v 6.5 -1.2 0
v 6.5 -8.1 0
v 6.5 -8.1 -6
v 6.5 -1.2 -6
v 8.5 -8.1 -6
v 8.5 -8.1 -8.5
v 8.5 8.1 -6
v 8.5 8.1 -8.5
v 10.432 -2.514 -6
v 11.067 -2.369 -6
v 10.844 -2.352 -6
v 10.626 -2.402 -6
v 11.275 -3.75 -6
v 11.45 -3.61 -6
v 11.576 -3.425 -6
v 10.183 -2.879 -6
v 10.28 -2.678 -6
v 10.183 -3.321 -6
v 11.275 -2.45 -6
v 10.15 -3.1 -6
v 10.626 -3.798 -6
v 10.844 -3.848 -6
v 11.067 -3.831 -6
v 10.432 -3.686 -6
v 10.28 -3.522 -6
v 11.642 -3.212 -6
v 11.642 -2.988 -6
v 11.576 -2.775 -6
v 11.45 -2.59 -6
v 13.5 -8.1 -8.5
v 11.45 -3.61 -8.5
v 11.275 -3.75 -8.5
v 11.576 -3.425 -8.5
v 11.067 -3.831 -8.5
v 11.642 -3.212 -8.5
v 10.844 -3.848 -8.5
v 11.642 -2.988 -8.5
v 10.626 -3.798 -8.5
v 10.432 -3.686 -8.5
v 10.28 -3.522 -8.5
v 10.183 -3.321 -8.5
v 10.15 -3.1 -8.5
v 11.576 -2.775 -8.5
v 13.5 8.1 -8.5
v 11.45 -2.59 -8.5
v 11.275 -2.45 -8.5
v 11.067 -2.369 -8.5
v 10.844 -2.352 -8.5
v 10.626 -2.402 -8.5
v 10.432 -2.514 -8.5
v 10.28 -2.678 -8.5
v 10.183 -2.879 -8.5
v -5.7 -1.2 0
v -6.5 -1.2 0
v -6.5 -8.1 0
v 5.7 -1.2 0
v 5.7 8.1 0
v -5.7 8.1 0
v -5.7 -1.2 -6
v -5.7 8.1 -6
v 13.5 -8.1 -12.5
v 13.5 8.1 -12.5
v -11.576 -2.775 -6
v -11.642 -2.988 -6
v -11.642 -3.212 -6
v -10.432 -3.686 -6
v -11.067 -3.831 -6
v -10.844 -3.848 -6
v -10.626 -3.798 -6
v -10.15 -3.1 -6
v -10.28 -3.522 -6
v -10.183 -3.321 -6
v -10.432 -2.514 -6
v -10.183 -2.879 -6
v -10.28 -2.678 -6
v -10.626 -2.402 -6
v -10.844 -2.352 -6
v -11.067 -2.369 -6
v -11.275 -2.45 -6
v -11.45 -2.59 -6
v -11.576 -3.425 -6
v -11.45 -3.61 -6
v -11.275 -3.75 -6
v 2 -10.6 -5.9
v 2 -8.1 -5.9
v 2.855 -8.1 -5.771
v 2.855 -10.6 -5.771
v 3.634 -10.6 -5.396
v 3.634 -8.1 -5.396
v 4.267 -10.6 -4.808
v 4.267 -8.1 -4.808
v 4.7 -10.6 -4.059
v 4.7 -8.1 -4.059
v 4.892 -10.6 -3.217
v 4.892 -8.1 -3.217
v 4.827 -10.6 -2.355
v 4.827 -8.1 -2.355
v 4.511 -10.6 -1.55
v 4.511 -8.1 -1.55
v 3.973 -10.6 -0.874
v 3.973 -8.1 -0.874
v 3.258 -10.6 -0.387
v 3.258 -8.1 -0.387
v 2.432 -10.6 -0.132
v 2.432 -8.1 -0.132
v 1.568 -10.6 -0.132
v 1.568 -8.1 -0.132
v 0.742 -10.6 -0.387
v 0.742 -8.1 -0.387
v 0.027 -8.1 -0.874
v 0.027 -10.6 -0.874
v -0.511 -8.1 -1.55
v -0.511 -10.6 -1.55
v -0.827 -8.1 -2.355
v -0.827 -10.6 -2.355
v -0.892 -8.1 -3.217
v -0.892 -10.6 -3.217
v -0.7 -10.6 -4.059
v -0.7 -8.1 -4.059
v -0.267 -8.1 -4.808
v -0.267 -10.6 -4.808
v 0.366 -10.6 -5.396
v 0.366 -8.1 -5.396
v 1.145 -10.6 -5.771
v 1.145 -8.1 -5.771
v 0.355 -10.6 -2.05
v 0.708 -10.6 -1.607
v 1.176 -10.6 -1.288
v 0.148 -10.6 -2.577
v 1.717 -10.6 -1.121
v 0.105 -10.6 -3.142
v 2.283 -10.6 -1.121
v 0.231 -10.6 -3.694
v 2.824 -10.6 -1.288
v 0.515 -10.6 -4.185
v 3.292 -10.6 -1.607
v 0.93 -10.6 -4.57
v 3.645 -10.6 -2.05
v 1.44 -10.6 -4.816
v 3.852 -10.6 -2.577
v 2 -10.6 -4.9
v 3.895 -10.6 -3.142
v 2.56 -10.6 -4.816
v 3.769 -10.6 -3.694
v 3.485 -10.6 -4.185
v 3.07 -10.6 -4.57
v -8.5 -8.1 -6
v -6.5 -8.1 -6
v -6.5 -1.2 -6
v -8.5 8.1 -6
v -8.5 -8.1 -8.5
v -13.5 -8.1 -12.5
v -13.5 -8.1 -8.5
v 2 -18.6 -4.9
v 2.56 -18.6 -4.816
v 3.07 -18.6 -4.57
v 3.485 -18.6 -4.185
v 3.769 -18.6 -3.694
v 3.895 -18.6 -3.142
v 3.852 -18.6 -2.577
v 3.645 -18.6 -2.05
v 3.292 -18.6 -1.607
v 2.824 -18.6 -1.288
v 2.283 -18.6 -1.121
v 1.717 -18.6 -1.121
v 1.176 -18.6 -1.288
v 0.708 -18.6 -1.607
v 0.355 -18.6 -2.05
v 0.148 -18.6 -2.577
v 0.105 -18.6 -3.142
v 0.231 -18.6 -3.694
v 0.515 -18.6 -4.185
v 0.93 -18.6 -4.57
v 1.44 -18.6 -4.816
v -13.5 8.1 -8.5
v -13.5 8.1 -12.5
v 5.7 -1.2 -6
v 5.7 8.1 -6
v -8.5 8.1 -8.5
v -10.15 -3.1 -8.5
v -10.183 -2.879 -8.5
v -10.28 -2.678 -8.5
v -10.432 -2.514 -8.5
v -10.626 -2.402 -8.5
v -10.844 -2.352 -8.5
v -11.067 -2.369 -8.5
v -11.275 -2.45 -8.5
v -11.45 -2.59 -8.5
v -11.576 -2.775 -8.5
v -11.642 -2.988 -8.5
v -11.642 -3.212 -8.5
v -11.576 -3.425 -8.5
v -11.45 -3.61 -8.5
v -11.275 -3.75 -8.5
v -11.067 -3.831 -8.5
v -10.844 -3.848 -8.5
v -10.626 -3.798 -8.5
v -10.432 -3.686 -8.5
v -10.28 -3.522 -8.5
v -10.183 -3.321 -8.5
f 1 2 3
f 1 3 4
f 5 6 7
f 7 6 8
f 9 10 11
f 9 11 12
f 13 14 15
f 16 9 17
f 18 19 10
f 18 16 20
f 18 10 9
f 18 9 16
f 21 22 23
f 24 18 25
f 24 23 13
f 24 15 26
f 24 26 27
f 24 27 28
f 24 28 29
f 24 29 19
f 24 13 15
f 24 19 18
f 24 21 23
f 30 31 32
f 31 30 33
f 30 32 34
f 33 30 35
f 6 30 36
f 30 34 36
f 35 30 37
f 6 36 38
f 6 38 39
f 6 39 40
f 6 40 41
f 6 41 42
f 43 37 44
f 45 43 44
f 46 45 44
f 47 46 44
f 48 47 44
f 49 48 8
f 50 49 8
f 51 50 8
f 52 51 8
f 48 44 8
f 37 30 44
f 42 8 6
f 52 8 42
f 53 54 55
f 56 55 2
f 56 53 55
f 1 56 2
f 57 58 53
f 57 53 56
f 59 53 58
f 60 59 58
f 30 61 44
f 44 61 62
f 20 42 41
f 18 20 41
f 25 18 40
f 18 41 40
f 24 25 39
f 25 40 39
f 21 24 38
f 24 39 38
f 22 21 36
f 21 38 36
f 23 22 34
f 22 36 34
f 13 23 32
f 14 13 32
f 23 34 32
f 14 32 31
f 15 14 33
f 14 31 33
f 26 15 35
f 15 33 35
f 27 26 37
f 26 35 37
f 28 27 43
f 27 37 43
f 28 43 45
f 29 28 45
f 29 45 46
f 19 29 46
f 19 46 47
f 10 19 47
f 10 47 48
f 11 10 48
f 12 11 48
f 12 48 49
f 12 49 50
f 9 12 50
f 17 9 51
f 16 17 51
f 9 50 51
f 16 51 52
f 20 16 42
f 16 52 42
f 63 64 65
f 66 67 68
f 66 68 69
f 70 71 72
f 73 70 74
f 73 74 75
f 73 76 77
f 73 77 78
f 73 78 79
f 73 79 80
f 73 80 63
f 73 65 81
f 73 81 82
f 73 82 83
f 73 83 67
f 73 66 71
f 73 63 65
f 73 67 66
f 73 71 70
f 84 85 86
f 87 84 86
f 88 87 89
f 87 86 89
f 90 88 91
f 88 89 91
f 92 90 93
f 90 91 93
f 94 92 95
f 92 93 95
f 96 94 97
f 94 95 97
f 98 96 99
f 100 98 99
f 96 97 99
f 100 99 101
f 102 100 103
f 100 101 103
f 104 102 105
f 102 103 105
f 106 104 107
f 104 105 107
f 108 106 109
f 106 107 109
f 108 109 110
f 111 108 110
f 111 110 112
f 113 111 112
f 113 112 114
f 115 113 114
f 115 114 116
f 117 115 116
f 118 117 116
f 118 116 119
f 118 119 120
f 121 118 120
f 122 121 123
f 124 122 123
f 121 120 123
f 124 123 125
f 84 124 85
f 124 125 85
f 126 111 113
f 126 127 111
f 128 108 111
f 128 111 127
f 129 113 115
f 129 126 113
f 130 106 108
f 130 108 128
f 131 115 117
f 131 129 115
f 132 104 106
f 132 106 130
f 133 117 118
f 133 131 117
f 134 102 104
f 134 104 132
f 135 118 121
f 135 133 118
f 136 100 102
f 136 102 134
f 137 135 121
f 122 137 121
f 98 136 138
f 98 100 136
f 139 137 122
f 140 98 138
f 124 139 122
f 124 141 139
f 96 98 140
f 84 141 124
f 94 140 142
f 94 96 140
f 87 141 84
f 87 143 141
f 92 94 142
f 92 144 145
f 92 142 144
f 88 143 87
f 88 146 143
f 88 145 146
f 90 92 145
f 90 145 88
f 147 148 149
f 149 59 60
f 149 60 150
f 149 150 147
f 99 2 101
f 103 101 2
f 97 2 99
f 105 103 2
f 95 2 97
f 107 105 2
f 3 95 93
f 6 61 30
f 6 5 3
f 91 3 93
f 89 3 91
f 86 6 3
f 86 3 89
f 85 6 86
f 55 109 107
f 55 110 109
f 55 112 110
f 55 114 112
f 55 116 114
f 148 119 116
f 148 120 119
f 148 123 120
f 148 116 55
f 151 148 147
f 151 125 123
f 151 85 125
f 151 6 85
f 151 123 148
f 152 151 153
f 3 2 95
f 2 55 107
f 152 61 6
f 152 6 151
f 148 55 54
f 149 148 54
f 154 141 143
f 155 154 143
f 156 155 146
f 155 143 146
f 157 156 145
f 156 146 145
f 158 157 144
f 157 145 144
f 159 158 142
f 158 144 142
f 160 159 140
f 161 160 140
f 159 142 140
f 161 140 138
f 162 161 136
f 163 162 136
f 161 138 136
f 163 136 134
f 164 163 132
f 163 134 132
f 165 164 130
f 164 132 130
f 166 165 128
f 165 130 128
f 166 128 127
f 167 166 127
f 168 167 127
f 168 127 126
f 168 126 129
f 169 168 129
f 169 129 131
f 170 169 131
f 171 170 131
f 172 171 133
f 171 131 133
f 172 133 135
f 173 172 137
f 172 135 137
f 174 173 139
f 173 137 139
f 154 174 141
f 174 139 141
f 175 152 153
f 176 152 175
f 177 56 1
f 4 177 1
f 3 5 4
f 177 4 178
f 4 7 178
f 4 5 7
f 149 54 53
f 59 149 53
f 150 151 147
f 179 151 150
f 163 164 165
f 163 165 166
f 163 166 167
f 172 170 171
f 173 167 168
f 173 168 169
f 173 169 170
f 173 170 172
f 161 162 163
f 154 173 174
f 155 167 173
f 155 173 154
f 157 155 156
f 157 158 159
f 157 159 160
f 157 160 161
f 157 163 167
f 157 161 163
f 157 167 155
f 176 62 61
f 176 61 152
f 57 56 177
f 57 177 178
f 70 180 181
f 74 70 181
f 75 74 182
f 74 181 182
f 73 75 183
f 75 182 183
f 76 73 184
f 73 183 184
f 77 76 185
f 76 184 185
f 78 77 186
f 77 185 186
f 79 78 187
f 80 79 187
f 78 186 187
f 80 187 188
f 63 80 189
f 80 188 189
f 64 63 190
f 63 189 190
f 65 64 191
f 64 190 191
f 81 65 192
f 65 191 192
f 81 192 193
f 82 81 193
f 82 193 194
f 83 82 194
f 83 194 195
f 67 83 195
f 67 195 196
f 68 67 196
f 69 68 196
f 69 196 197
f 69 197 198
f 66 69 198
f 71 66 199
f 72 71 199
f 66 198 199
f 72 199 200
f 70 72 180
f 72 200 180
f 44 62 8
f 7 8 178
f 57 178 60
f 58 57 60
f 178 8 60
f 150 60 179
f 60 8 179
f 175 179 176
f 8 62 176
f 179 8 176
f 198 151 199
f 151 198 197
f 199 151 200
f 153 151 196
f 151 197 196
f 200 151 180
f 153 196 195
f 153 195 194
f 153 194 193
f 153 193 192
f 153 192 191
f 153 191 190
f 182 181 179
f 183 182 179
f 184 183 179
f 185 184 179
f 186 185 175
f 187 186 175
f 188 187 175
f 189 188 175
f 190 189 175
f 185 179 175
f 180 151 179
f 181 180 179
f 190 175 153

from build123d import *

# Parameters (mm, degrees)
SKETCH1_W           = 13
SKETCH1_H           = 16.2
BOSS_EXTRUDE1_DEPTH = 12.5
SKETCH2_W           = 2
SKETCH2_H           = 16.2
BOSS_EXTRUDE5_DEPTH = 6.5
SKETCH7_R           = 2.9
BOSS_EXTRUDE6_DEPTH = 2.5
SKETCH8_R           = 1.9
BOSS_EXTRUDE7_DEPTH = 8
SKETCH9_W           = 5
SKETCH9_H           = 16.2
BOSS_EXTRUDE8_DEPTH = 4
SKETCH10_W          = 0.8
SKETCH10_H          = 9.3
CUT_EXTRUDE3_DEPTH  = 6
SKETCH11_R          = 0.75
BOSS_EXTRUDE9_DEPTH = 2.5


with BuildPart() as part:
    # Sketch1 → Boss-Extrude1 (new body)
    with BuildSketch(Plane.XY):
        Rectangle(SKETCH1_W, SKETCH1_H)
    extrude(amount=-BOSS_EXTRUDE1_DEPTH)

    # Sketch2 → Boss-Extrude5 (add)
    with BuildSketch(Plane(origin=(0, 0, -12.5), x_dir=(-1, 0, 0), z_dir=(0, 0, -1))):
        with Locations((-7.5, 0)):
            Rectangle(SKETCH2_W, SKETCH2_H)
        with Locations((7.5, 0)):
            Rectangle(SKETCH2_W, SKETCH2_H)
    extrude(amount=-BOSS_EXTRUDE5_DEPTH)

    # Sketch7 → Boss-Extrude6 (add)
    with BuildSketch(Plane.XZ.offset(8.1)):
        with Locations(Location((2, -3, 0), (0, 0, 270))):
            Circle(SKETCH7_R)
    extrude(amount=BOSS_EXTRUDE6_DEPTH)

    # Sketch8 → Boss-Extrude7 (add)
    with BuildSketch(Plane.XZ.offset(10.6)):
        with Locations(Location((2, -3, 0), (0, 0, 270))):
            Circle(SKETCH8_R)
    extrude(amount=BOSS_EXTRUDE7_DEPTH)

    # Sketch9 → Boss-Extrude8 (add)
    with BuildSketch(Plane(origin=(0, 0, -12.5), x_dir=(-1, 0, 0), z_dir=(0, 0, -1))):
        with Locations((-11, 0)):
            Rectangle(SKETCH9_W, SKETCH9_H)
        with Locations((11, 0)):
            Rectangle(SKETCH9_W, SKETCH9_H)
    extrude(amount=-BOSS_EXTRUDE8_DEPTH)

    # Sketch10 → Cut-Extrude3 (cut)
    with BuildSketch(Plane.XY):
        with Locations((6.1, 3.45)):
            Rectangle(SKETCH10_W, SKETCH10_H)
        with Locations((-6.1, 3.45)):
            Rectangle(SKETCH10_W, SKETCH10_H)
    extrude(amount=-CUT_EXTRUDE3_DEPTH, mode=Mode.SUBTRACT)

    # Sketch11 → Boss-Extrude9 (add)
    with BuildSketch(Plane.XY.offset(-8.5)):
        with Locations((-10.9, -3.1)):
            Circle(SKETCH11_R)
        with Locations(Location((10.9, -3.1, 0), (0, 0, 180))):
            Circle(SKETCH11_R)
    extrude(amount=BOSS_EXTRUDE9_DEPTH)


solid = part.part
